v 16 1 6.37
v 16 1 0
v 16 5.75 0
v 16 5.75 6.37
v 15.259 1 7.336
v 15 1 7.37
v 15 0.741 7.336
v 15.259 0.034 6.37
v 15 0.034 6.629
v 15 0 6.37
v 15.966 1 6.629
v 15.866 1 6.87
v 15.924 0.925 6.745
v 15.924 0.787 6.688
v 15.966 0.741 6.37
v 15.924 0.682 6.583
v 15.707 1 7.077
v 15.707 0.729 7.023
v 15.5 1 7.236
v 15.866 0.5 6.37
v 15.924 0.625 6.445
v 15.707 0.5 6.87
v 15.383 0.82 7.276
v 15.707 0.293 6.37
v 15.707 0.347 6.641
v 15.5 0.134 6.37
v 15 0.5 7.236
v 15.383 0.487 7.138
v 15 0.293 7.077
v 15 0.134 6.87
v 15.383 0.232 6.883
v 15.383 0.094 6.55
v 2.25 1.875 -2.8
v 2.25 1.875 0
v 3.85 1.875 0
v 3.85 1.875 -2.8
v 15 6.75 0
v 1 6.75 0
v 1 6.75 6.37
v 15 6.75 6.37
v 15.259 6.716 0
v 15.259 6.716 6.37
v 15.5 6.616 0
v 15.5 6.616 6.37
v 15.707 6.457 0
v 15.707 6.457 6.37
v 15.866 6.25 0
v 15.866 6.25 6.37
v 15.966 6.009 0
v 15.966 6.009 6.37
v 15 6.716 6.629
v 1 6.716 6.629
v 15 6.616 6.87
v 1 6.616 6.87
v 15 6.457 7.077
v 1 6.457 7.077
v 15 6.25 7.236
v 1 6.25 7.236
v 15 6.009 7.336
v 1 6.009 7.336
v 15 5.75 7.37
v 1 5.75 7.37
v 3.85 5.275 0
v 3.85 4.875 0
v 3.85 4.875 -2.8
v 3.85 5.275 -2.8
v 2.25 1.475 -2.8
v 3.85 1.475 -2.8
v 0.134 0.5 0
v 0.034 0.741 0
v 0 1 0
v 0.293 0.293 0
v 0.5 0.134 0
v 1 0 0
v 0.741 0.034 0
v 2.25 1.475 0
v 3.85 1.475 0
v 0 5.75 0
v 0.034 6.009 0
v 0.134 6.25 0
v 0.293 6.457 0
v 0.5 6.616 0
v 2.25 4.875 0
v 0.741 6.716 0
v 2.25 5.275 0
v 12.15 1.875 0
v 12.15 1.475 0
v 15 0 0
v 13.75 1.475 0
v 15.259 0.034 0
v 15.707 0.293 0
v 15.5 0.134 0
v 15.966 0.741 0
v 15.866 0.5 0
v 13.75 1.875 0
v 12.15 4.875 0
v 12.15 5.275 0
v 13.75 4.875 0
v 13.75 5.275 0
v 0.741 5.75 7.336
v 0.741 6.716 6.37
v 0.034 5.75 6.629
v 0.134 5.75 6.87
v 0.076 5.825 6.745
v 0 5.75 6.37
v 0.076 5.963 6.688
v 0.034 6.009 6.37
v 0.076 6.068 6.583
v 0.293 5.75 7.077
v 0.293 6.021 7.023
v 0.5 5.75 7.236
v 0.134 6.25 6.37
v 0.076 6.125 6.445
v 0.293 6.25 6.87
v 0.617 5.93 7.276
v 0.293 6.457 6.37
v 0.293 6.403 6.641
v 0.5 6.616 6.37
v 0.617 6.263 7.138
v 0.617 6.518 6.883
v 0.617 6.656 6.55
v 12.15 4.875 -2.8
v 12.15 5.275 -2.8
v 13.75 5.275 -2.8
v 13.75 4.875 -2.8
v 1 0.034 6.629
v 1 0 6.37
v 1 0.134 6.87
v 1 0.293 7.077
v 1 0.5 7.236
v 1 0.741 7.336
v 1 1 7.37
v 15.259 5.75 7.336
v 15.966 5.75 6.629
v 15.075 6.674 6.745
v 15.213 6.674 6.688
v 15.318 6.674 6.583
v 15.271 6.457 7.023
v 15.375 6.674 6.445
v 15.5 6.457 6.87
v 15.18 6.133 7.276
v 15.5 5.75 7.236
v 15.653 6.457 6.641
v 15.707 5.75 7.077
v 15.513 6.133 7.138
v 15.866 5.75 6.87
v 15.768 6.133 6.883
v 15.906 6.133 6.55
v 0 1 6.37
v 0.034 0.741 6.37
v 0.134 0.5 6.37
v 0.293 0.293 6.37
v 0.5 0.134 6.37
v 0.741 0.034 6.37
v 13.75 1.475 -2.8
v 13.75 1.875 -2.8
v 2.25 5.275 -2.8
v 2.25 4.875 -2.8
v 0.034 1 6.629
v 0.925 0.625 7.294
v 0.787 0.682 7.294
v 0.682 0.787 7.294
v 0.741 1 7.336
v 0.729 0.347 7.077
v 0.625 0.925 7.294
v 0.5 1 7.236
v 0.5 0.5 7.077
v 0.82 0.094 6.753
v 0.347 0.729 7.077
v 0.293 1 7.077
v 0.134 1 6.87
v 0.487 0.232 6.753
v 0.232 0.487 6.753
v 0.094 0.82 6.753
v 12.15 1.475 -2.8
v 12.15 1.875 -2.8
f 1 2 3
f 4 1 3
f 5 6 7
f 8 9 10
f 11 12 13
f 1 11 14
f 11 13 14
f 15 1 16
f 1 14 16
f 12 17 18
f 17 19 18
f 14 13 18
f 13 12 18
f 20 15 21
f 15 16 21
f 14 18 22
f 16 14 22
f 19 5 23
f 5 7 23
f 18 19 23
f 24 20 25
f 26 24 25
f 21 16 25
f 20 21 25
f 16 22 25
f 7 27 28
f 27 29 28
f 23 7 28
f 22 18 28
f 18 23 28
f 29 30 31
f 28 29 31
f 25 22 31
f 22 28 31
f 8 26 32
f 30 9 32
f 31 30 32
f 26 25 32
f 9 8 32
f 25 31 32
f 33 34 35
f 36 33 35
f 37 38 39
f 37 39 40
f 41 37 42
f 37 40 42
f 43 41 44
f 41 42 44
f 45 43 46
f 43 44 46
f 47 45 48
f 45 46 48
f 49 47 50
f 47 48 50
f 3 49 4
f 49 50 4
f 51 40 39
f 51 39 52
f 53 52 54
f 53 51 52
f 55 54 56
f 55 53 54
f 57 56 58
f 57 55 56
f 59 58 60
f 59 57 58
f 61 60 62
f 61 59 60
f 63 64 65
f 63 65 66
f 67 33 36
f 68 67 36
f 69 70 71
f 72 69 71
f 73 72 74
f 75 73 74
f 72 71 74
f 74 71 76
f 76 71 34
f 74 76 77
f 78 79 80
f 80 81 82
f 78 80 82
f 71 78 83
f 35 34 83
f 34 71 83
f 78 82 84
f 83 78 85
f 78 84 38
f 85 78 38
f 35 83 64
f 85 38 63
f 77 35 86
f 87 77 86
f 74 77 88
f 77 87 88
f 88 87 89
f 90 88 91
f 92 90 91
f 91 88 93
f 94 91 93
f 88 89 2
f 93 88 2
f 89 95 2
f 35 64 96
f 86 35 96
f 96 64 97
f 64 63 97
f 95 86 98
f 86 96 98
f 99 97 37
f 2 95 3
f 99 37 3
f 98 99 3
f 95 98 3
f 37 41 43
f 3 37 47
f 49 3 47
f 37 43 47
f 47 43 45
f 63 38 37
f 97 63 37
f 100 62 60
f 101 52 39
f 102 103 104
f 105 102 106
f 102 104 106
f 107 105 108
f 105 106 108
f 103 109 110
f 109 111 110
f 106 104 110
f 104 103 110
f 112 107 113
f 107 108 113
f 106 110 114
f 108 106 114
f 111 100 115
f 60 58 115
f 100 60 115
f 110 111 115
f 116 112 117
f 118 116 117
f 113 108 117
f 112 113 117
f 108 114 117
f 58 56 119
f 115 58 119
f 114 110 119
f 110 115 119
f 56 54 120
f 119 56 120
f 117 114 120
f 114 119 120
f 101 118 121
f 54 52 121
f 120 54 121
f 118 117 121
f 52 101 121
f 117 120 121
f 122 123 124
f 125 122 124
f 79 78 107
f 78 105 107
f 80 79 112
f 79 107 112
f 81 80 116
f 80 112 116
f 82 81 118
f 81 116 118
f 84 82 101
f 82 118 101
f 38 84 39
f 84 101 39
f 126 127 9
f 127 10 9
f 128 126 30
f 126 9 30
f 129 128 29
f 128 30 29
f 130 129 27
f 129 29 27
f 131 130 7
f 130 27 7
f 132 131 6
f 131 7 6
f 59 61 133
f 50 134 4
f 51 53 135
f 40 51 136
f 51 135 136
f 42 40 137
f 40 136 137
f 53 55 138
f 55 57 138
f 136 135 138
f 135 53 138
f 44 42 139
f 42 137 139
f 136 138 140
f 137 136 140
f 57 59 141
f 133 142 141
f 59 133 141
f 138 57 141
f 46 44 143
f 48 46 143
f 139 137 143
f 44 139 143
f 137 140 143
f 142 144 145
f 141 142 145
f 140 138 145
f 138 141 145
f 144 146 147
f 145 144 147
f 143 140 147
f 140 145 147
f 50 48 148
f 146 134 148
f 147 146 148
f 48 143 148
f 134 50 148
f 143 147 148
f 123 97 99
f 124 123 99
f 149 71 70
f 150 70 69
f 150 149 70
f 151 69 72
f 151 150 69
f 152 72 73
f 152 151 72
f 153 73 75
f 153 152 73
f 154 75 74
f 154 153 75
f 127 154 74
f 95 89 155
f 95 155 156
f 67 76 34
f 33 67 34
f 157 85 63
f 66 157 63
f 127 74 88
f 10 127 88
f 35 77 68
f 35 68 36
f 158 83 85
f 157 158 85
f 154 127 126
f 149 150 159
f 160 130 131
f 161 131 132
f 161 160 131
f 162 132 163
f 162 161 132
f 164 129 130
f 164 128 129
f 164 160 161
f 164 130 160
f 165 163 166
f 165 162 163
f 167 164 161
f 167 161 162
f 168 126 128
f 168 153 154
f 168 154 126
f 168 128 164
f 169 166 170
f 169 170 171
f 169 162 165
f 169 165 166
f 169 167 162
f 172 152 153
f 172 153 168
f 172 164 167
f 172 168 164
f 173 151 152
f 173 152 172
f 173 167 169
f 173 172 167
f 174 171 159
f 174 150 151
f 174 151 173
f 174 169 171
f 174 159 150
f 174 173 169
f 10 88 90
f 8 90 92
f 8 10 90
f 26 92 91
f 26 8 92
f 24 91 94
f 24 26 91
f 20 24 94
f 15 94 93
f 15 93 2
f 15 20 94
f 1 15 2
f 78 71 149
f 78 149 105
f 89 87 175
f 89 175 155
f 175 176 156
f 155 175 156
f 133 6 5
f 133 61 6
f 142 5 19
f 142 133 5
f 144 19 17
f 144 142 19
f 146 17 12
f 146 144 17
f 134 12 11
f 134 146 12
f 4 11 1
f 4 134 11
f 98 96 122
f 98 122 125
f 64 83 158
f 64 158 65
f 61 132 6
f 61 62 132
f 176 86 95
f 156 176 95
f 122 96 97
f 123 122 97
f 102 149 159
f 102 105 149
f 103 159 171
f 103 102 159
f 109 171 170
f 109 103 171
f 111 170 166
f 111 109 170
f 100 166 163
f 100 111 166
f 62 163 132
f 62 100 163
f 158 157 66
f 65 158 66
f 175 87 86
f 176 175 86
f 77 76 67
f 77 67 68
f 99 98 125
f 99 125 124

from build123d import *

# Parameters (mm, degrees)
SKETCH_W     = 16
SKETCH_H     = 6.75
PAD_DEPTH    = 7.37
SKETCH001_W  = 1.6
SKETCH001_H  = 0.4
PAD001_DEPTH = 2.8
FILLET_R     = 1


with BuildPart() as part:
    # Sketch → Pad (new body)
    with BuildSketch(Plane.XY):
        with Locations((8, 3.375)):
            Rectangle(SKETCH_W, SKETCH_H)
    extrude(amount=PAD_DEPTH)

    # Sketch001 → Pad001 (join)
    with BuildSketch(Plane.XY):
        with Locations((3.05, 5.075)):
            Rectangle(SKETCH001_W, SKETCH001_H)
        with Locations((12.95, 5.075)):
            Rectangle(SKETCH001_W, SKETCH001_H)
        with Locations((12.95, 1.675)):
            Rectangle(SKETCH001_W, SKETCH001_H)
        with Locations((3.05, 1.675)):
            Rectangle(SKETCH001_W, SKETCH001_H)
    extrude(amount=-PAD001_DEPTH)

    # Fillet
    fillet_edges = [part.edges().sort_by_distance(p)[0] for p in [
        (0, 0, 3.685),
        (8, 0, 7.37),
        (16, 3.375, 7.37),
        (8, 6.75, 7.37),
        (0, 3.375, 7.37),
        (16, 0, 3.685),
        (16, 6.75, 3.685),
        (0, 6.75, 3.685),
    ]]
    fillet(fillet_edges, radius=FILLET_R)


solid = part.part
